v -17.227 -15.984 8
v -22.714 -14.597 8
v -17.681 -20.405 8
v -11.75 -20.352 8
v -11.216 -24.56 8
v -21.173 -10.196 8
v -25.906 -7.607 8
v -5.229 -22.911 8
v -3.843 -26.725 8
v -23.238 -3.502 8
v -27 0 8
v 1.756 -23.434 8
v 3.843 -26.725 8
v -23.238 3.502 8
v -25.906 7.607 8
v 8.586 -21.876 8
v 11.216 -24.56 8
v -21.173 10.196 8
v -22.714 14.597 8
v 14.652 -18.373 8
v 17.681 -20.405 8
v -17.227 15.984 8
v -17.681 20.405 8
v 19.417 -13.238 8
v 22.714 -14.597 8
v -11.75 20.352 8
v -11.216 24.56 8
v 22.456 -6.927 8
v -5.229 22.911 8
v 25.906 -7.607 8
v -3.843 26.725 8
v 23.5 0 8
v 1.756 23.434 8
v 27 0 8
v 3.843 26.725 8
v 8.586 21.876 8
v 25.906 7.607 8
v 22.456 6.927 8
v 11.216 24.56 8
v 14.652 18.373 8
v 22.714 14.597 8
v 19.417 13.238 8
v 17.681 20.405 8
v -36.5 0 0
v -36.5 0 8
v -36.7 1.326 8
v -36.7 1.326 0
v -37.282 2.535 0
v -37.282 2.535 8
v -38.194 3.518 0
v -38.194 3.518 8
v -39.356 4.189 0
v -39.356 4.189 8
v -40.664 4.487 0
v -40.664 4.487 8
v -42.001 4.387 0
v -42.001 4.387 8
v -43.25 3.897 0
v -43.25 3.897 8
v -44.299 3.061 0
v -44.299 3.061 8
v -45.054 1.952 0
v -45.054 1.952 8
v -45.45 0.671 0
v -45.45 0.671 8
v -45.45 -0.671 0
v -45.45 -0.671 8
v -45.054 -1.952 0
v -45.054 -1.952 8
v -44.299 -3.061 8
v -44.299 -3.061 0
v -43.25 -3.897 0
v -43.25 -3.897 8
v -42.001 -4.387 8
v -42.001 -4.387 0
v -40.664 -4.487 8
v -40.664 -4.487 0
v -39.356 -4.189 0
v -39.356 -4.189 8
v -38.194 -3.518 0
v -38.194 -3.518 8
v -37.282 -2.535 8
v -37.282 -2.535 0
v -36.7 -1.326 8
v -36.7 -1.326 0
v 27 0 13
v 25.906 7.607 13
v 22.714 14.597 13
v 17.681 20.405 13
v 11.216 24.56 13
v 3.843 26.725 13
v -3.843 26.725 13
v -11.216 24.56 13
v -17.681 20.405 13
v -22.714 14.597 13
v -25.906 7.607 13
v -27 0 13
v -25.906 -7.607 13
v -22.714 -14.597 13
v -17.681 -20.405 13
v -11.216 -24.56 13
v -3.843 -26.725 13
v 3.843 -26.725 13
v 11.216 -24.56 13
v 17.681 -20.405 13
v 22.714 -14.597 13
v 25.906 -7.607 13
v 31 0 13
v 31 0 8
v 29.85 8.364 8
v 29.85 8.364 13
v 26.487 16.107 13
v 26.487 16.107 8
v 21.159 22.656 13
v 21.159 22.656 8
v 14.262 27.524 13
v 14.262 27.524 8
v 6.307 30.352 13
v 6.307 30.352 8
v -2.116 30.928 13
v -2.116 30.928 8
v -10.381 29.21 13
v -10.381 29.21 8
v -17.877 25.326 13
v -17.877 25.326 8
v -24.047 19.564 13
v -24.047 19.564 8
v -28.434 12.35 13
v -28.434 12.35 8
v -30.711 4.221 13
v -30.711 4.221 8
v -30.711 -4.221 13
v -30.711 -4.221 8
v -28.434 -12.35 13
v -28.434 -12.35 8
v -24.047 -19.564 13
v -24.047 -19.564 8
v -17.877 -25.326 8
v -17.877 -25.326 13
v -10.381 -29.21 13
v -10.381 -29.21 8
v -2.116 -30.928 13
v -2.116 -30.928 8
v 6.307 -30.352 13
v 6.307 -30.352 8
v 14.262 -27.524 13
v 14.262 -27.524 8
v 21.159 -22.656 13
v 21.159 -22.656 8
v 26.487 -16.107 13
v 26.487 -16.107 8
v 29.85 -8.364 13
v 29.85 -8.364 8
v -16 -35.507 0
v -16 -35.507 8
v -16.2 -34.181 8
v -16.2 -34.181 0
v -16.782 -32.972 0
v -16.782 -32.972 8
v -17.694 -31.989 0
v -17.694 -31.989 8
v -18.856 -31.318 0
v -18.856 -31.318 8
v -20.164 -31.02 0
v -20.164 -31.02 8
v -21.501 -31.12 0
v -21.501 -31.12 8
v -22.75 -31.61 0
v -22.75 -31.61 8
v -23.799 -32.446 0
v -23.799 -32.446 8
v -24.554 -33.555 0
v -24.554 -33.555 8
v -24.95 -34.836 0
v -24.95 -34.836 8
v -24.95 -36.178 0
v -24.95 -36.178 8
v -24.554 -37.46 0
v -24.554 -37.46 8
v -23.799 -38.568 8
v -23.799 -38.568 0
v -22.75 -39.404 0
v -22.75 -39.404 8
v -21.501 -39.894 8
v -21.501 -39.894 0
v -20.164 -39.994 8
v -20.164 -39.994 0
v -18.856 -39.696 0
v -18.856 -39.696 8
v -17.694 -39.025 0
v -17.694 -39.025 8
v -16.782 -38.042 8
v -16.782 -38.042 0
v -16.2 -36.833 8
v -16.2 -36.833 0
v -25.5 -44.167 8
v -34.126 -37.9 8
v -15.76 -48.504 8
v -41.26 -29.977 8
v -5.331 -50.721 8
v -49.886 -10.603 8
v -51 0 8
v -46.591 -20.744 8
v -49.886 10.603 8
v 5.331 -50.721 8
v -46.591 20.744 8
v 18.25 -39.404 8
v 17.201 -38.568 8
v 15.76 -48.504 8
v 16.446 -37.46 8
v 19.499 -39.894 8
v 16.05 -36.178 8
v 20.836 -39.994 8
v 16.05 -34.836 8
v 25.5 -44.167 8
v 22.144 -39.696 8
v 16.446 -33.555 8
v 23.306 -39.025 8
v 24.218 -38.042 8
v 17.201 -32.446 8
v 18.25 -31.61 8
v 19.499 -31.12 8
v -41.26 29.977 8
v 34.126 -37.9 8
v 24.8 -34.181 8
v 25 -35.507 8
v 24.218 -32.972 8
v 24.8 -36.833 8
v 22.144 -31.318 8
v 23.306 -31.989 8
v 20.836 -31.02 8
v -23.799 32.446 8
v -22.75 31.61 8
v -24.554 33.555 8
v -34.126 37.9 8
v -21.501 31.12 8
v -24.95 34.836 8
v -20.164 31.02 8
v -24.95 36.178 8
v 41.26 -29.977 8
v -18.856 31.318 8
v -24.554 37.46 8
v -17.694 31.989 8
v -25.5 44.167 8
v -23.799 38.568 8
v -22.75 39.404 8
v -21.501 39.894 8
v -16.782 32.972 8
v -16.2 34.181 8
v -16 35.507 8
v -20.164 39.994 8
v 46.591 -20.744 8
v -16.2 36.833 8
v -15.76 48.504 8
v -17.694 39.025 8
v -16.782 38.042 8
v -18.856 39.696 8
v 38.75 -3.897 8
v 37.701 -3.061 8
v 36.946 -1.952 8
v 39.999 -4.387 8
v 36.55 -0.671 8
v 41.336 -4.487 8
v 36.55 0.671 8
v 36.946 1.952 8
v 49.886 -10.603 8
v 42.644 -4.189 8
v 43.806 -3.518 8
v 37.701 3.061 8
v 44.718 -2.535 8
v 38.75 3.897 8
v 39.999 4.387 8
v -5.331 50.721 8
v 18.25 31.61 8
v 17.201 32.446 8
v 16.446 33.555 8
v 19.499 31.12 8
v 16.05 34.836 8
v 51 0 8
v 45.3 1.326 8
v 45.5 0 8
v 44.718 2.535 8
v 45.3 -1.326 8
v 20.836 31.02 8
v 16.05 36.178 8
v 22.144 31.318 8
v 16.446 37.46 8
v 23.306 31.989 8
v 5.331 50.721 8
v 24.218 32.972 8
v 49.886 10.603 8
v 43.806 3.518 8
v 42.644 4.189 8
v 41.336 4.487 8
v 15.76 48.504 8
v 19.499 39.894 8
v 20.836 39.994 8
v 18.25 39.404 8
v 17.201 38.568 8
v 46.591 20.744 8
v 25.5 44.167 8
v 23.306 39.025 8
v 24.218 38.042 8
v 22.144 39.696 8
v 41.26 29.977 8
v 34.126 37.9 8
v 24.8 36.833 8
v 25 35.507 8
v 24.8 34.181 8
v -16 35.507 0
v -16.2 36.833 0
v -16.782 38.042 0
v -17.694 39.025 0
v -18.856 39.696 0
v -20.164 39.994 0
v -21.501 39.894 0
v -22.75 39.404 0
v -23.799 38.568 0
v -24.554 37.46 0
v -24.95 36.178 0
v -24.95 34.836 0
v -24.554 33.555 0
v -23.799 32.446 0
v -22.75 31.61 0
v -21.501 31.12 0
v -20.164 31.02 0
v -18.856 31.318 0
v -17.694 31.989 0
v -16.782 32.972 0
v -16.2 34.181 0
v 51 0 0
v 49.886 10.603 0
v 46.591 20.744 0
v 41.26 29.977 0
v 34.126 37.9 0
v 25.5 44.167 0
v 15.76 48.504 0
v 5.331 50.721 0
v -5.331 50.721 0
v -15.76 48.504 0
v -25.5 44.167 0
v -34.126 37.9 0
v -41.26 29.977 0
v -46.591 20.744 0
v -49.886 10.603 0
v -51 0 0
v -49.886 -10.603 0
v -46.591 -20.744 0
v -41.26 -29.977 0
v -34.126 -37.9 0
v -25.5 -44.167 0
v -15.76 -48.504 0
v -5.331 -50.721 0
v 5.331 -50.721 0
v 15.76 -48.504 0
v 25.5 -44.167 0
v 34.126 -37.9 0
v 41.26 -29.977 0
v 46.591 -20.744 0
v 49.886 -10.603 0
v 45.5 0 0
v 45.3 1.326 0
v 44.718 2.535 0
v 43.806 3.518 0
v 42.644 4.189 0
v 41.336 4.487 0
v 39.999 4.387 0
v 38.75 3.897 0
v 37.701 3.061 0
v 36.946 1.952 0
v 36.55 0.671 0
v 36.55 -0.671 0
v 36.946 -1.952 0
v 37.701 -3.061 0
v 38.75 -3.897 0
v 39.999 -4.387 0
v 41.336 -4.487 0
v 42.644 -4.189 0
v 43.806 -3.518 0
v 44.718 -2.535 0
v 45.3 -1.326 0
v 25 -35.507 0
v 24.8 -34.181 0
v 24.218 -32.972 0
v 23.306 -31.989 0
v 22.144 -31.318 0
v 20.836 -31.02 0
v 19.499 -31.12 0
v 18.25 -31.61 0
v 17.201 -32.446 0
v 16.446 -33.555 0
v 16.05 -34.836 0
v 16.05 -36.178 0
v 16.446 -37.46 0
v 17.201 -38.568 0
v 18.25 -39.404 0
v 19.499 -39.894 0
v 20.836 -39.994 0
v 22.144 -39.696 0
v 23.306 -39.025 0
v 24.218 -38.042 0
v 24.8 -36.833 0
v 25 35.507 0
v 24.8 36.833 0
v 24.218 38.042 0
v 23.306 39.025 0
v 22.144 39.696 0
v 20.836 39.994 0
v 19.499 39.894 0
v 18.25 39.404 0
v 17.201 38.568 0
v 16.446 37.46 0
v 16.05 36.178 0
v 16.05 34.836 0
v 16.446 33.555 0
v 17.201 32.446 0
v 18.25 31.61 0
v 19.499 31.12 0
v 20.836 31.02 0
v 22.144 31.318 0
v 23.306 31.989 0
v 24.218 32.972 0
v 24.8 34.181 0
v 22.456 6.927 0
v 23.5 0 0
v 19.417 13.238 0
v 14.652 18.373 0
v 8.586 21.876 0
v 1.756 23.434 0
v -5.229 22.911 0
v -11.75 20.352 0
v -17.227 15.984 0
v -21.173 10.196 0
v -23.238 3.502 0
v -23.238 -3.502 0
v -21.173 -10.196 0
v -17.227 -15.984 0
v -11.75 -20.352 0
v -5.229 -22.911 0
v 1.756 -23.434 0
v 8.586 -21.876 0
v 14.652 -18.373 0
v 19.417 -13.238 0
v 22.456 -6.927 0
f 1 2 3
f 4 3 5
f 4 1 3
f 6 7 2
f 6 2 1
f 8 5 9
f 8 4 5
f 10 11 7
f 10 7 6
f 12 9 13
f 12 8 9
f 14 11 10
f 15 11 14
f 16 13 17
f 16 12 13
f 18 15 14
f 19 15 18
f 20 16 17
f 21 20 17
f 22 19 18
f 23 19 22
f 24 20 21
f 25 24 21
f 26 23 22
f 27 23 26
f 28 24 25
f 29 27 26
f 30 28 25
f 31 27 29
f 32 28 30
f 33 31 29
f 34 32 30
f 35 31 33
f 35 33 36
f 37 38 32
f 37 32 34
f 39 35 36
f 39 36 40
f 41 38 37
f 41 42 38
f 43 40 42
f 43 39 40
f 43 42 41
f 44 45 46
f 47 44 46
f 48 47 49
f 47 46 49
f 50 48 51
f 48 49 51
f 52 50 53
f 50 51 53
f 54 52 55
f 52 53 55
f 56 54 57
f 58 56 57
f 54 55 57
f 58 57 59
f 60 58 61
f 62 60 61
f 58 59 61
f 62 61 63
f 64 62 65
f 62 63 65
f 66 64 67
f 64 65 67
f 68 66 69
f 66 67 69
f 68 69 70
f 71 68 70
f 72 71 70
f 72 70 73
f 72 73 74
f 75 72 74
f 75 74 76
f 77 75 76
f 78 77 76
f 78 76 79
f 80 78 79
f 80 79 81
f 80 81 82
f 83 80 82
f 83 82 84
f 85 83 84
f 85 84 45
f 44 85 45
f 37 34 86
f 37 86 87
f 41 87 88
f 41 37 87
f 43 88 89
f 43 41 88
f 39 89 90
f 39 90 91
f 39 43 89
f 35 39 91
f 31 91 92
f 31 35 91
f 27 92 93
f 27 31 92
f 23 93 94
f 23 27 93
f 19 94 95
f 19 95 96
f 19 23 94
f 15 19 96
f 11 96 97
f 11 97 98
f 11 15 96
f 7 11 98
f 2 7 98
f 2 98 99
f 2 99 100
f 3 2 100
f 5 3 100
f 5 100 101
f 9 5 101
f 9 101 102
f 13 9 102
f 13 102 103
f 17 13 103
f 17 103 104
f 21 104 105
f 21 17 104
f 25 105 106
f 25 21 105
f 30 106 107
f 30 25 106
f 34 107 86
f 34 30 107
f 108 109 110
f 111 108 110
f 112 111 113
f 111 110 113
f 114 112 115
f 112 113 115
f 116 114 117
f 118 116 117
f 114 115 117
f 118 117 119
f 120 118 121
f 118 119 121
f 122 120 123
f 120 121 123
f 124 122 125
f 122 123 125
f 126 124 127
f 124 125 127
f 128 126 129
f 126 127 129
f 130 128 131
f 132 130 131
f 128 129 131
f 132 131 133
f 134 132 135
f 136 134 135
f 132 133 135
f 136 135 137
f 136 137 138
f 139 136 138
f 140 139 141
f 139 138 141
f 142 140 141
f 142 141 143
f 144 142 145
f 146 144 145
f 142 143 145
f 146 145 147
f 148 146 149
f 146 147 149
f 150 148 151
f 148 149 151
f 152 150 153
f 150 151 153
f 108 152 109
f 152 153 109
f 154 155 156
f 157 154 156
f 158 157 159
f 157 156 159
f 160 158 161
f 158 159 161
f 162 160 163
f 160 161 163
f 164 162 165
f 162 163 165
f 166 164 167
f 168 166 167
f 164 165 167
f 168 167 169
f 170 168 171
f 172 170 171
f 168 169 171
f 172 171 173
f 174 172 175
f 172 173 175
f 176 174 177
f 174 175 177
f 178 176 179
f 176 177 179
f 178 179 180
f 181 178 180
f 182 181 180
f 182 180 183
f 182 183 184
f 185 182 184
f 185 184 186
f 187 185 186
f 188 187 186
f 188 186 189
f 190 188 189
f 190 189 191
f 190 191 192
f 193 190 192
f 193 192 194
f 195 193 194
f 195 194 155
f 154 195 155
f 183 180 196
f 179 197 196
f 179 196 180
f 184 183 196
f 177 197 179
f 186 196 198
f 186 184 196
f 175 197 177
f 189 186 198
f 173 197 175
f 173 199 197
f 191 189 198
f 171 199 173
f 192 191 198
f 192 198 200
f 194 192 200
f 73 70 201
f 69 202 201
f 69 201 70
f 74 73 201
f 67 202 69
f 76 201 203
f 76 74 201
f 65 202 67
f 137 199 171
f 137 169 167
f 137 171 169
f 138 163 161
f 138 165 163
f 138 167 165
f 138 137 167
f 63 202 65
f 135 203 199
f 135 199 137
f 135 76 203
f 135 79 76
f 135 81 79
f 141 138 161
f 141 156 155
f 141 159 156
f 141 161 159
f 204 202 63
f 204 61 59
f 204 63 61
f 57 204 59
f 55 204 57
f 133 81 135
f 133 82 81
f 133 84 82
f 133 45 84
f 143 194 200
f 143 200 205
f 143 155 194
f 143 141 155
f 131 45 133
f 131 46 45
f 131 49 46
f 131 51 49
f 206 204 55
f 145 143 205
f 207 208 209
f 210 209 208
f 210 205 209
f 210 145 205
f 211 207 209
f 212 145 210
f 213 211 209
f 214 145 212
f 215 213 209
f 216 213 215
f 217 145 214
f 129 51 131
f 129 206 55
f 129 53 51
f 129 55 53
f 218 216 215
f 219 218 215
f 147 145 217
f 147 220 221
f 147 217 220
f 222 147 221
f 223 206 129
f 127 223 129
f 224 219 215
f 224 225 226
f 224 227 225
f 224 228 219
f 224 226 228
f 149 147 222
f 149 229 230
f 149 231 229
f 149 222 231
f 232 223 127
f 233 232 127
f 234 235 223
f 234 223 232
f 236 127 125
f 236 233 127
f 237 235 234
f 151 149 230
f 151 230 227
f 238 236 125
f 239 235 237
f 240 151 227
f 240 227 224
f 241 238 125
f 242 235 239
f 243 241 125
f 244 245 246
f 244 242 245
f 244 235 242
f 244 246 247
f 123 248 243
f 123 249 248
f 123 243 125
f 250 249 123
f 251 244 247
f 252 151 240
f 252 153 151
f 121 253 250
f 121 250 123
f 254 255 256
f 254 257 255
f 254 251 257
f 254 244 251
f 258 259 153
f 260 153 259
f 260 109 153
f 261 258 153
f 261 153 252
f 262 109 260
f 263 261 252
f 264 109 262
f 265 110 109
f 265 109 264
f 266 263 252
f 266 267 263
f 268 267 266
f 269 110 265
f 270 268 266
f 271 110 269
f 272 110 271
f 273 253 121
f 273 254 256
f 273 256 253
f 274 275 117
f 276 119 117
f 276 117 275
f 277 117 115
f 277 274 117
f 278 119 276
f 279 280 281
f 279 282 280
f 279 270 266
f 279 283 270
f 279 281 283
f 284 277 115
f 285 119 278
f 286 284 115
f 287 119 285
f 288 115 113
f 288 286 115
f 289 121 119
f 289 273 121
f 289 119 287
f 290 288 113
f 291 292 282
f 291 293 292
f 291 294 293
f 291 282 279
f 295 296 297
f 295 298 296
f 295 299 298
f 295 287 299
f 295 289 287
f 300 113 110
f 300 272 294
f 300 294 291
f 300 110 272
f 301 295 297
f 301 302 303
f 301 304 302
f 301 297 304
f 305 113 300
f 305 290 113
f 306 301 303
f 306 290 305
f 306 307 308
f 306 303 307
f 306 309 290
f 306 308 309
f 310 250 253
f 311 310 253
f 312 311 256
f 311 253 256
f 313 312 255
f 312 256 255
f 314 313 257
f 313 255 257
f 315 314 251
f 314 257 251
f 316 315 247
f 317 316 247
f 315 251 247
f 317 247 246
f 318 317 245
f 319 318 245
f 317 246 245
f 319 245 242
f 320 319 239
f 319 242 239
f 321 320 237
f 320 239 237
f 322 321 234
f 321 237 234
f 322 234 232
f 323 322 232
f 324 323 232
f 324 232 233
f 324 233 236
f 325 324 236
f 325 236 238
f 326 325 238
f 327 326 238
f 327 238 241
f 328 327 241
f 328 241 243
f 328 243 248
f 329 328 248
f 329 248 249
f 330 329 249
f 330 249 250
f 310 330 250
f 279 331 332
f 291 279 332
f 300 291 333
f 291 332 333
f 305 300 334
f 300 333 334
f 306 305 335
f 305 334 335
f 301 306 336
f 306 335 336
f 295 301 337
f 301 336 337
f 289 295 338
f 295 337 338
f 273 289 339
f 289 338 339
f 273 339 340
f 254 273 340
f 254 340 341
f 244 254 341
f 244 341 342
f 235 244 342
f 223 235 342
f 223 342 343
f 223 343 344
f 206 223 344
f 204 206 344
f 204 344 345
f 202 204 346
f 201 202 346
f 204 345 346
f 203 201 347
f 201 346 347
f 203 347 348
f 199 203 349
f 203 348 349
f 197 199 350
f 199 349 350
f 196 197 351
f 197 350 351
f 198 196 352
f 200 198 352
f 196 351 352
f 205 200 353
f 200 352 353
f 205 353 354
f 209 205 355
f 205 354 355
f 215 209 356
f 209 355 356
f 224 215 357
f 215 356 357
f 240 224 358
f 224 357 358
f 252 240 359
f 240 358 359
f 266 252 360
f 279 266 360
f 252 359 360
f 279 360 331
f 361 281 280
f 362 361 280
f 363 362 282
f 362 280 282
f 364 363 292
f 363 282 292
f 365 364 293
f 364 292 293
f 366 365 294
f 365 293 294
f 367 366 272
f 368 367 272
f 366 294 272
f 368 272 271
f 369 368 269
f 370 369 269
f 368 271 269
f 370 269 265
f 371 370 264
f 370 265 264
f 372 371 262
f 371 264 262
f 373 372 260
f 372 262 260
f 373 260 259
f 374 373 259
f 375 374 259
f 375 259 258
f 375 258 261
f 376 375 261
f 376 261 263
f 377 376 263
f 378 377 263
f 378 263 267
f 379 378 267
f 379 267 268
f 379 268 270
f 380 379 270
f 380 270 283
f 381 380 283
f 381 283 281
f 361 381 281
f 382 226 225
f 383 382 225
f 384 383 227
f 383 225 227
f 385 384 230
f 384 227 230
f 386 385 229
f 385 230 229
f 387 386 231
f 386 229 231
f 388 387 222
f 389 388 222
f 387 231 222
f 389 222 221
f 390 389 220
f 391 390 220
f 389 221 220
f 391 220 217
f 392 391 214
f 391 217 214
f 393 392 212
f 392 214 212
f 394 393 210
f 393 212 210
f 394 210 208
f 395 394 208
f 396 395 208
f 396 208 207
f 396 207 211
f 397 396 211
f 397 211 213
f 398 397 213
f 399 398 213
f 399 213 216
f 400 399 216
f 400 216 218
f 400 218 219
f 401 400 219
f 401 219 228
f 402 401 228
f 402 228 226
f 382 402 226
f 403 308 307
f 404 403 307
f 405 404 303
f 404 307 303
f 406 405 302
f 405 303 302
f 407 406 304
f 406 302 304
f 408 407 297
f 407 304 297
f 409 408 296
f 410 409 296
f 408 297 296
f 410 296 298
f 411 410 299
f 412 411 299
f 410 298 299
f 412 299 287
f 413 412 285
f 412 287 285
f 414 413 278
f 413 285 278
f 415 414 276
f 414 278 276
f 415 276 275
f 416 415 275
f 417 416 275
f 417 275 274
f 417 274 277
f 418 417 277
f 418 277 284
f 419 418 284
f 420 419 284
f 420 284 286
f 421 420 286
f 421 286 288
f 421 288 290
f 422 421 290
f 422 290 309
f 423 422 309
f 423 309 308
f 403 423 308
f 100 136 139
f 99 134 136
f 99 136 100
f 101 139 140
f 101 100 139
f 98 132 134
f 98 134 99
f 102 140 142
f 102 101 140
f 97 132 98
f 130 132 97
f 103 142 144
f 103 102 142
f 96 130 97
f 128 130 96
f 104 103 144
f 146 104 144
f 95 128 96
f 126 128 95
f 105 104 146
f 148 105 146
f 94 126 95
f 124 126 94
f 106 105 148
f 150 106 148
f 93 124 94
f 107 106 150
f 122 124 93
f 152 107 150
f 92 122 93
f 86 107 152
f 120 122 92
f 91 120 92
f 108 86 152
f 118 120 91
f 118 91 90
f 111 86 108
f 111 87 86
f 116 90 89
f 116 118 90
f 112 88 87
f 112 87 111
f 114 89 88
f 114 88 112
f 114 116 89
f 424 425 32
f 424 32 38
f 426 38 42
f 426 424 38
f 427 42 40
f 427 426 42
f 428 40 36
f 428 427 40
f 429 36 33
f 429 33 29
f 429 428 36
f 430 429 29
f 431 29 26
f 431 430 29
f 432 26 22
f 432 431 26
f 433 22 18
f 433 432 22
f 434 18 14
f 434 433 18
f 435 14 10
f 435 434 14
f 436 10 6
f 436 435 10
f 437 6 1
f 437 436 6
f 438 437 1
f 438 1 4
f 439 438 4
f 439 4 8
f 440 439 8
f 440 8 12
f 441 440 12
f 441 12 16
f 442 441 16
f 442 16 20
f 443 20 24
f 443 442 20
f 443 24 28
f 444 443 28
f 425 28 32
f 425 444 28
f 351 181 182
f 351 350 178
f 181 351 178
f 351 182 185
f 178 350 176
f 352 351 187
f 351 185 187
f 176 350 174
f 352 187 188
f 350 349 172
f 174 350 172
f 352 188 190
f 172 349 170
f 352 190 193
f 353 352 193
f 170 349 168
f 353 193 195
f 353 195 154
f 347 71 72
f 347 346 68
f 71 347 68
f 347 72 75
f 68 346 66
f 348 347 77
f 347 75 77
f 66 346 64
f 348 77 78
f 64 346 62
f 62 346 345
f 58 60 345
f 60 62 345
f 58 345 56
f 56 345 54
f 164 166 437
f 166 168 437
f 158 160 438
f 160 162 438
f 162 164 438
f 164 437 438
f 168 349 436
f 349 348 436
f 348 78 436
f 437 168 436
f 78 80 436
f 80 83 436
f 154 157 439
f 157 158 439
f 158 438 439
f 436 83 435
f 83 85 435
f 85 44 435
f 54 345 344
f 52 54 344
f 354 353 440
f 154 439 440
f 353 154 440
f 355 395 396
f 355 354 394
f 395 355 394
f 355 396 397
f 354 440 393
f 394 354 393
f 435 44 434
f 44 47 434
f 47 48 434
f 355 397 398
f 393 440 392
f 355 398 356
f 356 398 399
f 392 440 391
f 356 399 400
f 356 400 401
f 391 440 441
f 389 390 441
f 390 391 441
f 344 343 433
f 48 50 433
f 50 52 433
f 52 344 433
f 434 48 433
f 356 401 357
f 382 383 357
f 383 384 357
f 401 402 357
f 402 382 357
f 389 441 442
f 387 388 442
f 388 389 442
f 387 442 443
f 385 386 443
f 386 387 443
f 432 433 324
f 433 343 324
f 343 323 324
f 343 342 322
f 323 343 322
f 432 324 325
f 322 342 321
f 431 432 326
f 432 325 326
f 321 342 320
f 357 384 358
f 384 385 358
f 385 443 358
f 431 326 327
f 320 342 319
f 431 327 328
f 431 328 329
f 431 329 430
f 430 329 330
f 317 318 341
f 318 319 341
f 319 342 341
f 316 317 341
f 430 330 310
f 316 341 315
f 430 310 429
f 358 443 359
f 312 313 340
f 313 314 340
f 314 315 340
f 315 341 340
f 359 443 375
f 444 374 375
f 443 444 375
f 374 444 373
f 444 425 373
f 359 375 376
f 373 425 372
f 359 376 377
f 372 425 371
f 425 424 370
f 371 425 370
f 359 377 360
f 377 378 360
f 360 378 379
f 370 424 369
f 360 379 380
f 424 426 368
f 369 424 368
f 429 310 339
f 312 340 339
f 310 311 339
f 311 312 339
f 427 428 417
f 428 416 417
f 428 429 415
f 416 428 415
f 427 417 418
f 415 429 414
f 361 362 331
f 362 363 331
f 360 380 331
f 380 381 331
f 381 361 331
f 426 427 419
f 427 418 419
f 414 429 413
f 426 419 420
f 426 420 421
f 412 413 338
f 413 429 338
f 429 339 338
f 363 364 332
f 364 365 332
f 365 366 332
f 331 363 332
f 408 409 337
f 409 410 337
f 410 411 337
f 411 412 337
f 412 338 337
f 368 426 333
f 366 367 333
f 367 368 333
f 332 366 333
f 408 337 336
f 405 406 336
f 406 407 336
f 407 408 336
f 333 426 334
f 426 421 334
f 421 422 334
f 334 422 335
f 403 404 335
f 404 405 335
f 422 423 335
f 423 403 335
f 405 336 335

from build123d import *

# Parameters (mm, degrees)
SKETCH_1_R          = 51
SKETCH_1_R_2        = 23.5
EXTRUDE_1_DEPTH     = 8
SKETCH_2_R          = 31
SKETCH_2_R_2        = 27
EXTRUDE_2_DEPTH     = 5
CUT_EXTRUDE_1_REACH = 74.567
SKETCH_3_R          = 4.5


with BuildPart() as part:
    # 草图1 → 凸台-拉伸1 (new body)
    with BuildSketch(Plane.XY):
        Circle(SKETCH_1_R)
        Circle(SKETCH_1_R_2, mode=Mode.SUBTRACT)
    extrude(amount=EXTRUDE_1_DEPTH)

    # 草图2 → 凸台-拉伸2 (add)
    with BuildSketch(Plane.XY.offset(8)):
        Circle(SKETCH_2_R)
        Circle(SKETCH_2_R_2, mode=Mode.SUBTRACT)
    extrude(amount=EXTRUDE_2_DEPTH)

    # 草图3 → 切除-拉伸1 (cut, up to next)
    with BuildSketch(Plane.XY.offset(8), mode=Mode.PRIVATE) as cut_extrude_1_sk1:
        with Locations((41, 0)):
            Circle(SKETCH_3_R)
    cut_extrude_1_tool1 = extrude(cut_extrude_1_sk1.sketch, amount=-CUT_EXTRUDE_1_REACH, mode=Mode.PRIVATE) & part.part
    # 草图3 → 切除-拉伸1 (cut, up to next)
    with BuildSketch(Plane.XY.offset(8), mode=Mode.PRIVATE) as cut_extrude_1_sk2:
        with Locations((20.5, -35.507041555)):
            Circle(SKETCH_3_R)
    cut_extrude_1_tool2 = extrude(cut_extrude_1_sk2.sketch, amount=-CUT_EXTRUDE_1_REACH, mode=Mode.PRIVATE) & part.part
    # 草图3 → 切除-拉伸1 (cut, up to next)
    with BuildSketch(Plane.XY.offset(8), mode=Mode.PRIVATE) as cut_extrude_1_sk3:
        with Locations((-20.5, -35.507041555)):
            Circle(SKETCH_3_R)
    cut_extrude_1_tool3 = extrude(cut_extrude_1_sk3.sketch, amount=-CUT_EXTRUDE_1_REACH, mode=Mode.PRIVATE) & part.part
    # 草图3 → 切除-拉伸1 (cut, up to next)
    with BuildSketch(Plane.XY.offset(8), mode=Mode.PRIVATE) as cut_extrude_1_sk4:
        with Locations((-41, 0)):
            Circle(SKETCH_3_R)
    cut_extrude_1_tool4 = extrude(cut_extrude_1_sk4.sketch, amount=-CUT_EXTRUDE_1_REACH, mode=Mode.PRIVATE) & part.part
    # 草图3 → 切除-拉伸1 (cut, up to next)
    with BuildSketch(Plane.XY.offset(8), mode=Mode.PRIVATE) as cut_extrude_1_sk5:
        with Locations((-20.5, 35.507041555)):
            Circle(SKETCH_3_R)
    cut_extrude_1_tool5 = extrude(cut_extrude_1_sk5.sketch, amount=-CUT_EXTRUDE_1_REACH, mode=Mode.PRIVATE) & part.part
    # 草图3 → 切除-拉伸1 (cut, up to next)
    with BuildSketch(Plane.XY.offset(8), mode=Mode.PRIVATE) as cut_extrude_1_sk6:
        with Locations((20.5, 35.507041555)):
            Circle(SKETCH_3_R)
    cut_extrude_1_tool6 = extrude(cut_extrude_1_sk6.sketch, amount=-CUT_EXTRUDE_1_REACH, mode=Mode.PRIVATE) & part.part
    add(cut_extrude_1_tool1.solids().sort_by_distance((41, 0, 8))[0], mode=Mode.SUBTRACT)
    add(cut_extrude_1_tool2.solids().sort_by_distance((20.5, -35.507042, 8))[0], mode=Mode.SUBTRACT)
    add(cut_extrude_1_tool3.solids().sort_by_distance((-20.5, -35.507042, 8))[0], mode=Mode.SUBTRACT)
    add(cut_extrude_1_tool4.solids().sort_by_distance((-41, 0, 8))[0], mode=Mode.SUBTRACT)
    add(cut_extrude_1_tool5.solids().sort_by_distance((-20.5, 35.507042, 8))[0], mode=Mode.SUBTRACT)
    add(cut_extrude_1_tool6.solids().sort_by_distance((20.5, 35.507042, 8))[0], mode=Mode.SUBTRACT)


solid = part.part
